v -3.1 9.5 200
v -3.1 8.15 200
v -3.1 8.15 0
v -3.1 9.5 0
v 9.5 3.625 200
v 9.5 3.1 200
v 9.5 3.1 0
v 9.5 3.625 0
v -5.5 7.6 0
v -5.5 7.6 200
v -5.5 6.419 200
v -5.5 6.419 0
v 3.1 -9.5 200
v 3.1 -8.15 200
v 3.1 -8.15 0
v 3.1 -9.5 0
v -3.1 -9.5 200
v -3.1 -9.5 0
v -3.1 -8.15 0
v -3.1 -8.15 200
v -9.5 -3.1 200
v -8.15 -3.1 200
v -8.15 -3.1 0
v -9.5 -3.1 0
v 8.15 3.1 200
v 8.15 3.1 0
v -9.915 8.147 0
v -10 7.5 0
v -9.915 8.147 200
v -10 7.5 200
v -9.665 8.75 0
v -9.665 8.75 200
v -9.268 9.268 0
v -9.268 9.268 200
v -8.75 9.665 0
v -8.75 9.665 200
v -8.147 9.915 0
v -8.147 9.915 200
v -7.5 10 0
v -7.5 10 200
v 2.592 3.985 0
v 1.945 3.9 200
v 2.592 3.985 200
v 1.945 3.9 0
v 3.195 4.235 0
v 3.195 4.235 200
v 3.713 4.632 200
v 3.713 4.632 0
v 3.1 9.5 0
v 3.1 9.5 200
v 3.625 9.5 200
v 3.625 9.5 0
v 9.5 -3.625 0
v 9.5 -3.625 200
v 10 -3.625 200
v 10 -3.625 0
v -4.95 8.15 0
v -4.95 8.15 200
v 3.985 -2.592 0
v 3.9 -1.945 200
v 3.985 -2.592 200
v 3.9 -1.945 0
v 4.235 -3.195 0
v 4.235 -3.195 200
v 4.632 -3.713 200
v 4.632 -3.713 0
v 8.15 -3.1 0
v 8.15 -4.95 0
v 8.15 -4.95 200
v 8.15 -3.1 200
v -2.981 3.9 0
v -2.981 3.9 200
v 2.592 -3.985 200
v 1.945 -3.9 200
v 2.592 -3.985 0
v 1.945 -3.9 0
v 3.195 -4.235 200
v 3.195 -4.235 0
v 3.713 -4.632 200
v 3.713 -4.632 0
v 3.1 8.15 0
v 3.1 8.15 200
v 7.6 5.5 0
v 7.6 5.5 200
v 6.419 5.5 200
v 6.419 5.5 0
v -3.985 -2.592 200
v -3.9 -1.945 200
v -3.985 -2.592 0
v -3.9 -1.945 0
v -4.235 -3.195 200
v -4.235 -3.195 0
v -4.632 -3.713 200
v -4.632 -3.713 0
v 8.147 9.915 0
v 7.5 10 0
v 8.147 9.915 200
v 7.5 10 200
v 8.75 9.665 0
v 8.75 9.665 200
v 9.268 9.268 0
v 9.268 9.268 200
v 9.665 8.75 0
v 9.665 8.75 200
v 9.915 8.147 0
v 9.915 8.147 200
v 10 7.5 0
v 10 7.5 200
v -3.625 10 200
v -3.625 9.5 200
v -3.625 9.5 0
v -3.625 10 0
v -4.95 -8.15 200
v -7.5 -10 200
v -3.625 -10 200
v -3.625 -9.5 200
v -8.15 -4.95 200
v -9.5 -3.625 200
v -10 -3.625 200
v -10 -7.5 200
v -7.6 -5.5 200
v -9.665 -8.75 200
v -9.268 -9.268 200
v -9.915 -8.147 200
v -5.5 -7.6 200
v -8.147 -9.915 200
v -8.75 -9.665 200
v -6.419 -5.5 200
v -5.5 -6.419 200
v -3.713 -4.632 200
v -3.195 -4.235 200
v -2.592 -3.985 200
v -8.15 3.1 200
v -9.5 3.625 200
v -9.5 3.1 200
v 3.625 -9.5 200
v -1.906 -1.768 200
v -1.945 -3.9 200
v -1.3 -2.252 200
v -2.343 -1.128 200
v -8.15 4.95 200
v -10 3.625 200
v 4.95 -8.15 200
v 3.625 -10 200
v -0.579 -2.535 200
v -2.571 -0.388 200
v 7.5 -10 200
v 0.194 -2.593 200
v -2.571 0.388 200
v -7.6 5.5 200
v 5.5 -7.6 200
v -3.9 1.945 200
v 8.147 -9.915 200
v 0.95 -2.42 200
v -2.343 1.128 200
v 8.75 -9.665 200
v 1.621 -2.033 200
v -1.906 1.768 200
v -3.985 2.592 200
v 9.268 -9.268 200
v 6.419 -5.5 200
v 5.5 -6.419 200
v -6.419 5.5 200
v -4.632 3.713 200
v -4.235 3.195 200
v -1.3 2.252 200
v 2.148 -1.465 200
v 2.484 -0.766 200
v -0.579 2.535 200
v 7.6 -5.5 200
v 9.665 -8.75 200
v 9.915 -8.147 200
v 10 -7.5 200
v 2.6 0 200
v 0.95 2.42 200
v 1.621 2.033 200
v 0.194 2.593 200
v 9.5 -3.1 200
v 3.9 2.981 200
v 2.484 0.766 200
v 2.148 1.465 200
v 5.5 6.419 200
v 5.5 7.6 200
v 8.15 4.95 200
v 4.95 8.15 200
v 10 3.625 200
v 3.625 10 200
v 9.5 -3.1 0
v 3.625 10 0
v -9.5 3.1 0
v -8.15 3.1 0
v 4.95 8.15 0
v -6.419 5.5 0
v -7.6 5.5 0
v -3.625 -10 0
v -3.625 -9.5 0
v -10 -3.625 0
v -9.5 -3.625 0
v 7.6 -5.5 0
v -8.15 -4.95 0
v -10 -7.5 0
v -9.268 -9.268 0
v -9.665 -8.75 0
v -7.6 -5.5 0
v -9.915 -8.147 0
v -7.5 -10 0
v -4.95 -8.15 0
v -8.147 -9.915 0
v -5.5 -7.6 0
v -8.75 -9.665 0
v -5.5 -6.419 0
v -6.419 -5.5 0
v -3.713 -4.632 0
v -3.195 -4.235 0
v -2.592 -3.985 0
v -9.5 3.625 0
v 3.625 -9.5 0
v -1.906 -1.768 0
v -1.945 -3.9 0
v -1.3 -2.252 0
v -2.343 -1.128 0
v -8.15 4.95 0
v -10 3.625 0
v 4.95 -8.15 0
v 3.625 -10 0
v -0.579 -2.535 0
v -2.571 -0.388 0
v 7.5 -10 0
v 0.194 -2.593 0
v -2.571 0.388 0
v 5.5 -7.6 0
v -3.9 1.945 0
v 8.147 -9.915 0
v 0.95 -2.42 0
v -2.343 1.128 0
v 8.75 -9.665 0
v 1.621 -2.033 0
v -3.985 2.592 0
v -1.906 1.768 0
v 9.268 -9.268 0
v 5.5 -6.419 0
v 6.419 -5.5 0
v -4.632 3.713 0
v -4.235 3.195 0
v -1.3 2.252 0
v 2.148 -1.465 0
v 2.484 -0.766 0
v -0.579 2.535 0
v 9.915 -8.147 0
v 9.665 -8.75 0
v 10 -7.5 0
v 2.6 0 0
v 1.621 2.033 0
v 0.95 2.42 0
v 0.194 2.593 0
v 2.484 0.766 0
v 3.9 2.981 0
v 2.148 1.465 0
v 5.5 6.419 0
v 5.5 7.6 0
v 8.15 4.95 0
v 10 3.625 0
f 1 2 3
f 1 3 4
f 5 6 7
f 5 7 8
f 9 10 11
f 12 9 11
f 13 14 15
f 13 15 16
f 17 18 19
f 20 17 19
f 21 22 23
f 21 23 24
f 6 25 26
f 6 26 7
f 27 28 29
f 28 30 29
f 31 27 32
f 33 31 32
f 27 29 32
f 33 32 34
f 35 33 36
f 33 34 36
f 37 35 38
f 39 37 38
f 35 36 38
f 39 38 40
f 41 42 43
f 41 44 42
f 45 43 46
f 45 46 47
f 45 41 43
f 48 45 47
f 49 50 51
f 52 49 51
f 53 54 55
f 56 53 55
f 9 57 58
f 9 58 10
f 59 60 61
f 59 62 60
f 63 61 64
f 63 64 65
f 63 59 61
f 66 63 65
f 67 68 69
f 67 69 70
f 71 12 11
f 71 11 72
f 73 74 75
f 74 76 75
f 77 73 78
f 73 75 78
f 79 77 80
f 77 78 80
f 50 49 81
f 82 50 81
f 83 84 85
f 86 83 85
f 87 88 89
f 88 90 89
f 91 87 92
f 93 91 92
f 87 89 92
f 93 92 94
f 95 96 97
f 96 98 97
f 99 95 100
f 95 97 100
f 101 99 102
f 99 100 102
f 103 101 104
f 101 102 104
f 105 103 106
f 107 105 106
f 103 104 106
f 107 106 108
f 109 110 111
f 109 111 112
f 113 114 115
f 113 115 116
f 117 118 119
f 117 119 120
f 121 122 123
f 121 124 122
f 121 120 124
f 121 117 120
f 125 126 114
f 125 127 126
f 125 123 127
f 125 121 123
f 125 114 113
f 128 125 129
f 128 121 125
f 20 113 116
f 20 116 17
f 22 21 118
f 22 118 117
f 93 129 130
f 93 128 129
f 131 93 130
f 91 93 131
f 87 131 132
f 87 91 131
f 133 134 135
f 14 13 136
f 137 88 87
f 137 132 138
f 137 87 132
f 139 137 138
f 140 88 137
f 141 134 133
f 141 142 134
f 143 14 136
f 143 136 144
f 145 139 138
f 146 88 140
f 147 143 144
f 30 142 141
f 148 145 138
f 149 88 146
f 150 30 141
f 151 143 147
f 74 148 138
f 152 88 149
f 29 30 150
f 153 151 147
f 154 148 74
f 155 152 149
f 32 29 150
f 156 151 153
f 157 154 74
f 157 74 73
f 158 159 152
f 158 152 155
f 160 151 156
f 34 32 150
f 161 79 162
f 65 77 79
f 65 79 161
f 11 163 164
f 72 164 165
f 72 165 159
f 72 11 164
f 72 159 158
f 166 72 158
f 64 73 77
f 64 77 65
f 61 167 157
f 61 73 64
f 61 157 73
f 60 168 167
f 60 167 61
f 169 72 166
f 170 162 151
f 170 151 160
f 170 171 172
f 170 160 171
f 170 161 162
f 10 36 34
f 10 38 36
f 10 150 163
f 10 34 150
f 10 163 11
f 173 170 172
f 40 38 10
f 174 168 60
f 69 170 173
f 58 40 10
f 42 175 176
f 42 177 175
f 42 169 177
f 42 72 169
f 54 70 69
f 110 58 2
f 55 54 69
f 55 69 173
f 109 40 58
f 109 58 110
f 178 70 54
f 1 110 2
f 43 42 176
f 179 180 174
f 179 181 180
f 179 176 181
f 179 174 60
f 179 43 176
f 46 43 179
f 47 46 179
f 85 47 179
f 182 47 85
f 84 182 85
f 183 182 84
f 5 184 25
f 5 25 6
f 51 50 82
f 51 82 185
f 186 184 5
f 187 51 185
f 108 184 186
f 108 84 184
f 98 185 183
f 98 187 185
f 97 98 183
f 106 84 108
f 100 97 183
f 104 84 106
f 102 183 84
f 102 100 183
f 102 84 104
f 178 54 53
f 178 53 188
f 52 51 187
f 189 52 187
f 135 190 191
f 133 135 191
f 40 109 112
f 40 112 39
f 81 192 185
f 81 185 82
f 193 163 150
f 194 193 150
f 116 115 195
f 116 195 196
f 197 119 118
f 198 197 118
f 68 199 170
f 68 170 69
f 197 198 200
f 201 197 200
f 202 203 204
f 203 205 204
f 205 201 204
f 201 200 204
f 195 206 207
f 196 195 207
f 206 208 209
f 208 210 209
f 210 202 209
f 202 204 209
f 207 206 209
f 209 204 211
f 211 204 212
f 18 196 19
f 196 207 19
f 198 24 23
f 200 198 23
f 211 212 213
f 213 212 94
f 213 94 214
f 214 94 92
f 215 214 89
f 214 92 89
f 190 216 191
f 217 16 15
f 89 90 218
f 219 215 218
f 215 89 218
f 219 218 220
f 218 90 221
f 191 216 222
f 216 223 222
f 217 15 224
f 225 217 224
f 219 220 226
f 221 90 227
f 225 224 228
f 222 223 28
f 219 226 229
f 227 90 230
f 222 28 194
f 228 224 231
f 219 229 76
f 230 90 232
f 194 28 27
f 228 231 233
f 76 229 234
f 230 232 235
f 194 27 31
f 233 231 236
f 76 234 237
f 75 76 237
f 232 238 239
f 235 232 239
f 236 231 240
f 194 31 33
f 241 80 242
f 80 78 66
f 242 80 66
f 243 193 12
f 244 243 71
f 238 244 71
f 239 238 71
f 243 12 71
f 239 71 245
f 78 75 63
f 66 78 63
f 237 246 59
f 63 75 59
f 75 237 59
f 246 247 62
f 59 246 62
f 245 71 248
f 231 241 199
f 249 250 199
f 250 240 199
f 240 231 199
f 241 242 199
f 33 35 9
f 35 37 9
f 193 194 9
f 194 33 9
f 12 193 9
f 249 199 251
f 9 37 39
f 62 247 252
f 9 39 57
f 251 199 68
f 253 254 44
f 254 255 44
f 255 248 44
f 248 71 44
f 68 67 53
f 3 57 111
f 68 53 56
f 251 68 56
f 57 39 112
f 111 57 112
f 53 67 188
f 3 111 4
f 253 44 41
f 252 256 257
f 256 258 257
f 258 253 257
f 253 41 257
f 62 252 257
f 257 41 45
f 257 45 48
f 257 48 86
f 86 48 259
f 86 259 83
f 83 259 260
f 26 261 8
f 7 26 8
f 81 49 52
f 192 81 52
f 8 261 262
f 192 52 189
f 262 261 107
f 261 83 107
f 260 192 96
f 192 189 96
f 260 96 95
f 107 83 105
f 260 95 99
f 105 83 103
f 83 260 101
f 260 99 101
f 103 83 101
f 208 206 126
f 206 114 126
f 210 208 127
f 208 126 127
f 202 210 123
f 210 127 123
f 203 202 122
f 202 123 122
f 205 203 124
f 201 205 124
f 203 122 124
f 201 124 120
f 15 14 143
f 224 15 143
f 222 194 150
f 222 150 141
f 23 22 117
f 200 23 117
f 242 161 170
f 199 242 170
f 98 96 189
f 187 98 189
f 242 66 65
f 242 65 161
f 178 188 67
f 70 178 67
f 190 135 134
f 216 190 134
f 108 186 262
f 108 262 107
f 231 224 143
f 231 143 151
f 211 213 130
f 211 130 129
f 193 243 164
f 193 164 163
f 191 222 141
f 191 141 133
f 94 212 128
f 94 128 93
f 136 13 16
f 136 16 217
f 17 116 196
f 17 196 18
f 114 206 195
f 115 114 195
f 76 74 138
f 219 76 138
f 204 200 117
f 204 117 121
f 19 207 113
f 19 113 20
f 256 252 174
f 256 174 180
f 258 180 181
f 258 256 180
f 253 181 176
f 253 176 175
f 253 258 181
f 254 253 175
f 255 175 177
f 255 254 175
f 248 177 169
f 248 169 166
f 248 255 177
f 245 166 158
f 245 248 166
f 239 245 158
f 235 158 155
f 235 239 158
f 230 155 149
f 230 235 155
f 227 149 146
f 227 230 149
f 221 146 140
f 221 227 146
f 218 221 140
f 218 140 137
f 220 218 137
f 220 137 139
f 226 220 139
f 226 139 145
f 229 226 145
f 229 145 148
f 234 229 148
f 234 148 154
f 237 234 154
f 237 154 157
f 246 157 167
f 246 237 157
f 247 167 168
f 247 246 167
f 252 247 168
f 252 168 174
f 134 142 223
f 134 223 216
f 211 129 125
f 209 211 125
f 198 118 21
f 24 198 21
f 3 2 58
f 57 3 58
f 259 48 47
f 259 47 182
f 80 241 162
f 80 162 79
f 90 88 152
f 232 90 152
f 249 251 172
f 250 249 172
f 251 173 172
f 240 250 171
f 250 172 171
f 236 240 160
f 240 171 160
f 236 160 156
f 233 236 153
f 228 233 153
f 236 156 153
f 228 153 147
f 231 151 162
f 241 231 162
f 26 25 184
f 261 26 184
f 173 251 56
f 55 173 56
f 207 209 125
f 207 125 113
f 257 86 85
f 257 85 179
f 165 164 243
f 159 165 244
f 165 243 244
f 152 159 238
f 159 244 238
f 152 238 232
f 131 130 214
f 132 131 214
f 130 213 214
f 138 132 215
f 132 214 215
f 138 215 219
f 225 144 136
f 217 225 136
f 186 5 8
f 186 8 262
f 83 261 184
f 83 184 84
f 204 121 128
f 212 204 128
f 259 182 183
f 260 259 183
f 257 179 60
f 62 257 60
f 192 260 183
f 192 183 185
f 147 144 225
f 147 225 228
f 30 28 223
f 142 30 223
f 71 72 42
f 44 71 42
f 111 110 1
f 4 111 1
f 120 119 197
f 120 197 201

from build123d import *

# Parameters (mm, degrees)
SKETCH1_W           = 16.3
SKETCH1_H           = 16.3
SKETCH1_W_2         = 11
SKETCH1_H_2         = 11
SKETCH1_R           = 2.6
BOSS_EXTRUDE1_DEPTH = 200
CUT_EXTRUDE2_DEPTH  = 201.499376558
FILLET1_R           = 2.5
FILLET2_R           = 2.5
SKETCH3_W           = 1
SKETCH3_H           = 7.25
SKETCH3_W_2         = 7.25
SKETCH3_H_2         = 1
CUT_EXTRUDE3_DEPTH  = 201.499376558


with BuildPart() as part:
    # Sketch1 → Boss-Extrude1 (new body)
    # profile 1 of 6: a face of its own
    with BuildSketch(Plane.XY):
        Polygon((-3.1, 8.15), (-3.1, 10), (-10, 10), (-10, 3.1), (-8.15, 3.1), (-8.15, 8.15), align=None)
    # profile 2 of 6: a face of its own
    with BuildSketch(Plane.XY):
        Polygon((10, 10), (3.1, 10), (3.1, 8.15), (8.15, 8.15), (8.15, 3.1), (10, 3.1), align=None)
    # profile 3 of 6: a face of its own
    with BuildSketch(Plane.XY):
        Rectangle(SKETCH1_W, SKETCH1_H)
        Rectangle(SKETCH1_W_2, SKETCH1_H_2, mode=Mode.SUBTRACT)
    # profile 4 of 6: a face of its own
    with BuildSketch(Plane.XY):
        Polygon((10, -10), (10, -3.1), (8.15, -3.1), (8.15, -8.15), (3.1, -8.15), (3.1, -10), align=None)
    # profile 5 of 6: a face of its own
    with BuildSketch(Plane.XY):
        Polygon((-8.15, -3.1), (-10, -3.1), (-10, -10), (-3.1, -10), (-3.1, -8.15), (-8.15, -8.15), align=None)
    # profile 6 of 6: a face of its own
    with BuildSketch(Plane.XY):
        Rectangle(SKETCH1_W_2, SKETCH1_H_2)
        Circle(SKETCH1_R, mode=Mode.SUBTRACT)
    extrude(amount=BOSS_EXTRUDE1_DEPTH)

    # Sketch2 → Cut-Extrude2 (cut, through all)
    with BuildSketch(Plane.XY.offset(200)):
        Polygon((-5.5, -4.580761184), (-5.5, 4.580761184), (-6.419238816, 5.5), (-7.6, 5.5), (-8.15, 4.95), (-8.15, 3.1), (-8.15, -3.1), (-8.15, -4.95), (-7.6, -5.5), (-6.419238816, -5.5), align=None)
        Polygon((-3.9, -2.980761184), (-3.9, 2.980761184), (-5.5, 4.580761184), (-5.5, -4.580761184), align=None)
        Polygon((-5.5, 6.419238816), (-4.580761184, 5.5), (4.580761184, 5.5), (5.5, 6.419238816), (5.5, 7.6), (4.95, 8.15), (3.1, 8.15), (-3.1, 8.15), (-4.95, 8.15), (-5.5, 7.6), align=None)
        Polygon((-4.580761184, 5.5), (-2.980761184, 3.9), (2.980761184, 3.9), (4.580761184, 5.5), align=None)
        Polygon((6.419238816, 5.5), (5.5, 4.580761184), (5.5, -4.580761184), (6.419238816, -5.5), (7.6, -5.5), (8.15, -4.95), (8.15, -3.1), (8.15, 3.1), (8.15, 4.95), (7.6, 5.5), align=None)
        Polygon((5.5, 4.580761184), (3.9, 2.980761184), (3.9, -2.980761184), (5.5, -4.580761184), align=None)
        Polygon((4.580761184, -5.5), (-4.580761184, -5.5), (-5.5, -6.419238816), (-5.5, -7.6), (-4.95, -8.15), (-3.1, -8.15), (3.1, -8.15), (4.95, -8.15), (5.5, -7.6), (5.5, -6.419238816), align=None)
        Polygon((2.980761184, -3.9), (-2.980761184, -3.9), (-4.580761184, -5.5), (4.580761184, -5.5), align=None)
    extrude(amount=-CUT_EXTRUDE2_DEPTH, mode=Mode.SUBTRACT)

    # Fillet1
    fillet1_edges = [part.edges().sort_by_distance(p)[0] for p in [
        (-10, -10, 100),
        (-10, 10, 100),
        (10, 10, 100),
        (10, -10, 100),
    ]]
    fillet(fillet1_edges, radius=FILLET1_R)

    # Fillet2
    fillet2_edges = [part.edges().sort_by_distance(p)[0] for p in [
        (2.980761184, 3.9, 100),
        (3.9, -2.980761184, 100),
        (-2.980761184, -3.9, 100),
        (2.980761184, -3.9, 100),
        (-3.9, 2.980761184, 100),
        (-3.9, -2.980761184, 100),
    ]]
    fillet(fillet2_edges, radius=FILLET2_R)

    # Sketch3 → Cut-Extrude3 (cut, through all)
    with BuildSketch(Plane.XY.offset(200)):
        with Locations((10, 0)):
            Rectangle(SKETCH3_W, SKETCH3_H)
        with Locations((0, 10)):
            Rectangle(SKETCH3_W_2, SKETCH3_H_2)
        with Locations((0, -10)):
            Rectangle(SKETCH3_W_2, SKETCH3_H_2)
        with Locations((-10, 0)):
            Rectangle(SKETCH3_W, SKETCH3_H)
    extrude(amount=-CUT_EXTRUDE3_DEPTH, mode=Mode.SUBTRACT)


solid = part.part
